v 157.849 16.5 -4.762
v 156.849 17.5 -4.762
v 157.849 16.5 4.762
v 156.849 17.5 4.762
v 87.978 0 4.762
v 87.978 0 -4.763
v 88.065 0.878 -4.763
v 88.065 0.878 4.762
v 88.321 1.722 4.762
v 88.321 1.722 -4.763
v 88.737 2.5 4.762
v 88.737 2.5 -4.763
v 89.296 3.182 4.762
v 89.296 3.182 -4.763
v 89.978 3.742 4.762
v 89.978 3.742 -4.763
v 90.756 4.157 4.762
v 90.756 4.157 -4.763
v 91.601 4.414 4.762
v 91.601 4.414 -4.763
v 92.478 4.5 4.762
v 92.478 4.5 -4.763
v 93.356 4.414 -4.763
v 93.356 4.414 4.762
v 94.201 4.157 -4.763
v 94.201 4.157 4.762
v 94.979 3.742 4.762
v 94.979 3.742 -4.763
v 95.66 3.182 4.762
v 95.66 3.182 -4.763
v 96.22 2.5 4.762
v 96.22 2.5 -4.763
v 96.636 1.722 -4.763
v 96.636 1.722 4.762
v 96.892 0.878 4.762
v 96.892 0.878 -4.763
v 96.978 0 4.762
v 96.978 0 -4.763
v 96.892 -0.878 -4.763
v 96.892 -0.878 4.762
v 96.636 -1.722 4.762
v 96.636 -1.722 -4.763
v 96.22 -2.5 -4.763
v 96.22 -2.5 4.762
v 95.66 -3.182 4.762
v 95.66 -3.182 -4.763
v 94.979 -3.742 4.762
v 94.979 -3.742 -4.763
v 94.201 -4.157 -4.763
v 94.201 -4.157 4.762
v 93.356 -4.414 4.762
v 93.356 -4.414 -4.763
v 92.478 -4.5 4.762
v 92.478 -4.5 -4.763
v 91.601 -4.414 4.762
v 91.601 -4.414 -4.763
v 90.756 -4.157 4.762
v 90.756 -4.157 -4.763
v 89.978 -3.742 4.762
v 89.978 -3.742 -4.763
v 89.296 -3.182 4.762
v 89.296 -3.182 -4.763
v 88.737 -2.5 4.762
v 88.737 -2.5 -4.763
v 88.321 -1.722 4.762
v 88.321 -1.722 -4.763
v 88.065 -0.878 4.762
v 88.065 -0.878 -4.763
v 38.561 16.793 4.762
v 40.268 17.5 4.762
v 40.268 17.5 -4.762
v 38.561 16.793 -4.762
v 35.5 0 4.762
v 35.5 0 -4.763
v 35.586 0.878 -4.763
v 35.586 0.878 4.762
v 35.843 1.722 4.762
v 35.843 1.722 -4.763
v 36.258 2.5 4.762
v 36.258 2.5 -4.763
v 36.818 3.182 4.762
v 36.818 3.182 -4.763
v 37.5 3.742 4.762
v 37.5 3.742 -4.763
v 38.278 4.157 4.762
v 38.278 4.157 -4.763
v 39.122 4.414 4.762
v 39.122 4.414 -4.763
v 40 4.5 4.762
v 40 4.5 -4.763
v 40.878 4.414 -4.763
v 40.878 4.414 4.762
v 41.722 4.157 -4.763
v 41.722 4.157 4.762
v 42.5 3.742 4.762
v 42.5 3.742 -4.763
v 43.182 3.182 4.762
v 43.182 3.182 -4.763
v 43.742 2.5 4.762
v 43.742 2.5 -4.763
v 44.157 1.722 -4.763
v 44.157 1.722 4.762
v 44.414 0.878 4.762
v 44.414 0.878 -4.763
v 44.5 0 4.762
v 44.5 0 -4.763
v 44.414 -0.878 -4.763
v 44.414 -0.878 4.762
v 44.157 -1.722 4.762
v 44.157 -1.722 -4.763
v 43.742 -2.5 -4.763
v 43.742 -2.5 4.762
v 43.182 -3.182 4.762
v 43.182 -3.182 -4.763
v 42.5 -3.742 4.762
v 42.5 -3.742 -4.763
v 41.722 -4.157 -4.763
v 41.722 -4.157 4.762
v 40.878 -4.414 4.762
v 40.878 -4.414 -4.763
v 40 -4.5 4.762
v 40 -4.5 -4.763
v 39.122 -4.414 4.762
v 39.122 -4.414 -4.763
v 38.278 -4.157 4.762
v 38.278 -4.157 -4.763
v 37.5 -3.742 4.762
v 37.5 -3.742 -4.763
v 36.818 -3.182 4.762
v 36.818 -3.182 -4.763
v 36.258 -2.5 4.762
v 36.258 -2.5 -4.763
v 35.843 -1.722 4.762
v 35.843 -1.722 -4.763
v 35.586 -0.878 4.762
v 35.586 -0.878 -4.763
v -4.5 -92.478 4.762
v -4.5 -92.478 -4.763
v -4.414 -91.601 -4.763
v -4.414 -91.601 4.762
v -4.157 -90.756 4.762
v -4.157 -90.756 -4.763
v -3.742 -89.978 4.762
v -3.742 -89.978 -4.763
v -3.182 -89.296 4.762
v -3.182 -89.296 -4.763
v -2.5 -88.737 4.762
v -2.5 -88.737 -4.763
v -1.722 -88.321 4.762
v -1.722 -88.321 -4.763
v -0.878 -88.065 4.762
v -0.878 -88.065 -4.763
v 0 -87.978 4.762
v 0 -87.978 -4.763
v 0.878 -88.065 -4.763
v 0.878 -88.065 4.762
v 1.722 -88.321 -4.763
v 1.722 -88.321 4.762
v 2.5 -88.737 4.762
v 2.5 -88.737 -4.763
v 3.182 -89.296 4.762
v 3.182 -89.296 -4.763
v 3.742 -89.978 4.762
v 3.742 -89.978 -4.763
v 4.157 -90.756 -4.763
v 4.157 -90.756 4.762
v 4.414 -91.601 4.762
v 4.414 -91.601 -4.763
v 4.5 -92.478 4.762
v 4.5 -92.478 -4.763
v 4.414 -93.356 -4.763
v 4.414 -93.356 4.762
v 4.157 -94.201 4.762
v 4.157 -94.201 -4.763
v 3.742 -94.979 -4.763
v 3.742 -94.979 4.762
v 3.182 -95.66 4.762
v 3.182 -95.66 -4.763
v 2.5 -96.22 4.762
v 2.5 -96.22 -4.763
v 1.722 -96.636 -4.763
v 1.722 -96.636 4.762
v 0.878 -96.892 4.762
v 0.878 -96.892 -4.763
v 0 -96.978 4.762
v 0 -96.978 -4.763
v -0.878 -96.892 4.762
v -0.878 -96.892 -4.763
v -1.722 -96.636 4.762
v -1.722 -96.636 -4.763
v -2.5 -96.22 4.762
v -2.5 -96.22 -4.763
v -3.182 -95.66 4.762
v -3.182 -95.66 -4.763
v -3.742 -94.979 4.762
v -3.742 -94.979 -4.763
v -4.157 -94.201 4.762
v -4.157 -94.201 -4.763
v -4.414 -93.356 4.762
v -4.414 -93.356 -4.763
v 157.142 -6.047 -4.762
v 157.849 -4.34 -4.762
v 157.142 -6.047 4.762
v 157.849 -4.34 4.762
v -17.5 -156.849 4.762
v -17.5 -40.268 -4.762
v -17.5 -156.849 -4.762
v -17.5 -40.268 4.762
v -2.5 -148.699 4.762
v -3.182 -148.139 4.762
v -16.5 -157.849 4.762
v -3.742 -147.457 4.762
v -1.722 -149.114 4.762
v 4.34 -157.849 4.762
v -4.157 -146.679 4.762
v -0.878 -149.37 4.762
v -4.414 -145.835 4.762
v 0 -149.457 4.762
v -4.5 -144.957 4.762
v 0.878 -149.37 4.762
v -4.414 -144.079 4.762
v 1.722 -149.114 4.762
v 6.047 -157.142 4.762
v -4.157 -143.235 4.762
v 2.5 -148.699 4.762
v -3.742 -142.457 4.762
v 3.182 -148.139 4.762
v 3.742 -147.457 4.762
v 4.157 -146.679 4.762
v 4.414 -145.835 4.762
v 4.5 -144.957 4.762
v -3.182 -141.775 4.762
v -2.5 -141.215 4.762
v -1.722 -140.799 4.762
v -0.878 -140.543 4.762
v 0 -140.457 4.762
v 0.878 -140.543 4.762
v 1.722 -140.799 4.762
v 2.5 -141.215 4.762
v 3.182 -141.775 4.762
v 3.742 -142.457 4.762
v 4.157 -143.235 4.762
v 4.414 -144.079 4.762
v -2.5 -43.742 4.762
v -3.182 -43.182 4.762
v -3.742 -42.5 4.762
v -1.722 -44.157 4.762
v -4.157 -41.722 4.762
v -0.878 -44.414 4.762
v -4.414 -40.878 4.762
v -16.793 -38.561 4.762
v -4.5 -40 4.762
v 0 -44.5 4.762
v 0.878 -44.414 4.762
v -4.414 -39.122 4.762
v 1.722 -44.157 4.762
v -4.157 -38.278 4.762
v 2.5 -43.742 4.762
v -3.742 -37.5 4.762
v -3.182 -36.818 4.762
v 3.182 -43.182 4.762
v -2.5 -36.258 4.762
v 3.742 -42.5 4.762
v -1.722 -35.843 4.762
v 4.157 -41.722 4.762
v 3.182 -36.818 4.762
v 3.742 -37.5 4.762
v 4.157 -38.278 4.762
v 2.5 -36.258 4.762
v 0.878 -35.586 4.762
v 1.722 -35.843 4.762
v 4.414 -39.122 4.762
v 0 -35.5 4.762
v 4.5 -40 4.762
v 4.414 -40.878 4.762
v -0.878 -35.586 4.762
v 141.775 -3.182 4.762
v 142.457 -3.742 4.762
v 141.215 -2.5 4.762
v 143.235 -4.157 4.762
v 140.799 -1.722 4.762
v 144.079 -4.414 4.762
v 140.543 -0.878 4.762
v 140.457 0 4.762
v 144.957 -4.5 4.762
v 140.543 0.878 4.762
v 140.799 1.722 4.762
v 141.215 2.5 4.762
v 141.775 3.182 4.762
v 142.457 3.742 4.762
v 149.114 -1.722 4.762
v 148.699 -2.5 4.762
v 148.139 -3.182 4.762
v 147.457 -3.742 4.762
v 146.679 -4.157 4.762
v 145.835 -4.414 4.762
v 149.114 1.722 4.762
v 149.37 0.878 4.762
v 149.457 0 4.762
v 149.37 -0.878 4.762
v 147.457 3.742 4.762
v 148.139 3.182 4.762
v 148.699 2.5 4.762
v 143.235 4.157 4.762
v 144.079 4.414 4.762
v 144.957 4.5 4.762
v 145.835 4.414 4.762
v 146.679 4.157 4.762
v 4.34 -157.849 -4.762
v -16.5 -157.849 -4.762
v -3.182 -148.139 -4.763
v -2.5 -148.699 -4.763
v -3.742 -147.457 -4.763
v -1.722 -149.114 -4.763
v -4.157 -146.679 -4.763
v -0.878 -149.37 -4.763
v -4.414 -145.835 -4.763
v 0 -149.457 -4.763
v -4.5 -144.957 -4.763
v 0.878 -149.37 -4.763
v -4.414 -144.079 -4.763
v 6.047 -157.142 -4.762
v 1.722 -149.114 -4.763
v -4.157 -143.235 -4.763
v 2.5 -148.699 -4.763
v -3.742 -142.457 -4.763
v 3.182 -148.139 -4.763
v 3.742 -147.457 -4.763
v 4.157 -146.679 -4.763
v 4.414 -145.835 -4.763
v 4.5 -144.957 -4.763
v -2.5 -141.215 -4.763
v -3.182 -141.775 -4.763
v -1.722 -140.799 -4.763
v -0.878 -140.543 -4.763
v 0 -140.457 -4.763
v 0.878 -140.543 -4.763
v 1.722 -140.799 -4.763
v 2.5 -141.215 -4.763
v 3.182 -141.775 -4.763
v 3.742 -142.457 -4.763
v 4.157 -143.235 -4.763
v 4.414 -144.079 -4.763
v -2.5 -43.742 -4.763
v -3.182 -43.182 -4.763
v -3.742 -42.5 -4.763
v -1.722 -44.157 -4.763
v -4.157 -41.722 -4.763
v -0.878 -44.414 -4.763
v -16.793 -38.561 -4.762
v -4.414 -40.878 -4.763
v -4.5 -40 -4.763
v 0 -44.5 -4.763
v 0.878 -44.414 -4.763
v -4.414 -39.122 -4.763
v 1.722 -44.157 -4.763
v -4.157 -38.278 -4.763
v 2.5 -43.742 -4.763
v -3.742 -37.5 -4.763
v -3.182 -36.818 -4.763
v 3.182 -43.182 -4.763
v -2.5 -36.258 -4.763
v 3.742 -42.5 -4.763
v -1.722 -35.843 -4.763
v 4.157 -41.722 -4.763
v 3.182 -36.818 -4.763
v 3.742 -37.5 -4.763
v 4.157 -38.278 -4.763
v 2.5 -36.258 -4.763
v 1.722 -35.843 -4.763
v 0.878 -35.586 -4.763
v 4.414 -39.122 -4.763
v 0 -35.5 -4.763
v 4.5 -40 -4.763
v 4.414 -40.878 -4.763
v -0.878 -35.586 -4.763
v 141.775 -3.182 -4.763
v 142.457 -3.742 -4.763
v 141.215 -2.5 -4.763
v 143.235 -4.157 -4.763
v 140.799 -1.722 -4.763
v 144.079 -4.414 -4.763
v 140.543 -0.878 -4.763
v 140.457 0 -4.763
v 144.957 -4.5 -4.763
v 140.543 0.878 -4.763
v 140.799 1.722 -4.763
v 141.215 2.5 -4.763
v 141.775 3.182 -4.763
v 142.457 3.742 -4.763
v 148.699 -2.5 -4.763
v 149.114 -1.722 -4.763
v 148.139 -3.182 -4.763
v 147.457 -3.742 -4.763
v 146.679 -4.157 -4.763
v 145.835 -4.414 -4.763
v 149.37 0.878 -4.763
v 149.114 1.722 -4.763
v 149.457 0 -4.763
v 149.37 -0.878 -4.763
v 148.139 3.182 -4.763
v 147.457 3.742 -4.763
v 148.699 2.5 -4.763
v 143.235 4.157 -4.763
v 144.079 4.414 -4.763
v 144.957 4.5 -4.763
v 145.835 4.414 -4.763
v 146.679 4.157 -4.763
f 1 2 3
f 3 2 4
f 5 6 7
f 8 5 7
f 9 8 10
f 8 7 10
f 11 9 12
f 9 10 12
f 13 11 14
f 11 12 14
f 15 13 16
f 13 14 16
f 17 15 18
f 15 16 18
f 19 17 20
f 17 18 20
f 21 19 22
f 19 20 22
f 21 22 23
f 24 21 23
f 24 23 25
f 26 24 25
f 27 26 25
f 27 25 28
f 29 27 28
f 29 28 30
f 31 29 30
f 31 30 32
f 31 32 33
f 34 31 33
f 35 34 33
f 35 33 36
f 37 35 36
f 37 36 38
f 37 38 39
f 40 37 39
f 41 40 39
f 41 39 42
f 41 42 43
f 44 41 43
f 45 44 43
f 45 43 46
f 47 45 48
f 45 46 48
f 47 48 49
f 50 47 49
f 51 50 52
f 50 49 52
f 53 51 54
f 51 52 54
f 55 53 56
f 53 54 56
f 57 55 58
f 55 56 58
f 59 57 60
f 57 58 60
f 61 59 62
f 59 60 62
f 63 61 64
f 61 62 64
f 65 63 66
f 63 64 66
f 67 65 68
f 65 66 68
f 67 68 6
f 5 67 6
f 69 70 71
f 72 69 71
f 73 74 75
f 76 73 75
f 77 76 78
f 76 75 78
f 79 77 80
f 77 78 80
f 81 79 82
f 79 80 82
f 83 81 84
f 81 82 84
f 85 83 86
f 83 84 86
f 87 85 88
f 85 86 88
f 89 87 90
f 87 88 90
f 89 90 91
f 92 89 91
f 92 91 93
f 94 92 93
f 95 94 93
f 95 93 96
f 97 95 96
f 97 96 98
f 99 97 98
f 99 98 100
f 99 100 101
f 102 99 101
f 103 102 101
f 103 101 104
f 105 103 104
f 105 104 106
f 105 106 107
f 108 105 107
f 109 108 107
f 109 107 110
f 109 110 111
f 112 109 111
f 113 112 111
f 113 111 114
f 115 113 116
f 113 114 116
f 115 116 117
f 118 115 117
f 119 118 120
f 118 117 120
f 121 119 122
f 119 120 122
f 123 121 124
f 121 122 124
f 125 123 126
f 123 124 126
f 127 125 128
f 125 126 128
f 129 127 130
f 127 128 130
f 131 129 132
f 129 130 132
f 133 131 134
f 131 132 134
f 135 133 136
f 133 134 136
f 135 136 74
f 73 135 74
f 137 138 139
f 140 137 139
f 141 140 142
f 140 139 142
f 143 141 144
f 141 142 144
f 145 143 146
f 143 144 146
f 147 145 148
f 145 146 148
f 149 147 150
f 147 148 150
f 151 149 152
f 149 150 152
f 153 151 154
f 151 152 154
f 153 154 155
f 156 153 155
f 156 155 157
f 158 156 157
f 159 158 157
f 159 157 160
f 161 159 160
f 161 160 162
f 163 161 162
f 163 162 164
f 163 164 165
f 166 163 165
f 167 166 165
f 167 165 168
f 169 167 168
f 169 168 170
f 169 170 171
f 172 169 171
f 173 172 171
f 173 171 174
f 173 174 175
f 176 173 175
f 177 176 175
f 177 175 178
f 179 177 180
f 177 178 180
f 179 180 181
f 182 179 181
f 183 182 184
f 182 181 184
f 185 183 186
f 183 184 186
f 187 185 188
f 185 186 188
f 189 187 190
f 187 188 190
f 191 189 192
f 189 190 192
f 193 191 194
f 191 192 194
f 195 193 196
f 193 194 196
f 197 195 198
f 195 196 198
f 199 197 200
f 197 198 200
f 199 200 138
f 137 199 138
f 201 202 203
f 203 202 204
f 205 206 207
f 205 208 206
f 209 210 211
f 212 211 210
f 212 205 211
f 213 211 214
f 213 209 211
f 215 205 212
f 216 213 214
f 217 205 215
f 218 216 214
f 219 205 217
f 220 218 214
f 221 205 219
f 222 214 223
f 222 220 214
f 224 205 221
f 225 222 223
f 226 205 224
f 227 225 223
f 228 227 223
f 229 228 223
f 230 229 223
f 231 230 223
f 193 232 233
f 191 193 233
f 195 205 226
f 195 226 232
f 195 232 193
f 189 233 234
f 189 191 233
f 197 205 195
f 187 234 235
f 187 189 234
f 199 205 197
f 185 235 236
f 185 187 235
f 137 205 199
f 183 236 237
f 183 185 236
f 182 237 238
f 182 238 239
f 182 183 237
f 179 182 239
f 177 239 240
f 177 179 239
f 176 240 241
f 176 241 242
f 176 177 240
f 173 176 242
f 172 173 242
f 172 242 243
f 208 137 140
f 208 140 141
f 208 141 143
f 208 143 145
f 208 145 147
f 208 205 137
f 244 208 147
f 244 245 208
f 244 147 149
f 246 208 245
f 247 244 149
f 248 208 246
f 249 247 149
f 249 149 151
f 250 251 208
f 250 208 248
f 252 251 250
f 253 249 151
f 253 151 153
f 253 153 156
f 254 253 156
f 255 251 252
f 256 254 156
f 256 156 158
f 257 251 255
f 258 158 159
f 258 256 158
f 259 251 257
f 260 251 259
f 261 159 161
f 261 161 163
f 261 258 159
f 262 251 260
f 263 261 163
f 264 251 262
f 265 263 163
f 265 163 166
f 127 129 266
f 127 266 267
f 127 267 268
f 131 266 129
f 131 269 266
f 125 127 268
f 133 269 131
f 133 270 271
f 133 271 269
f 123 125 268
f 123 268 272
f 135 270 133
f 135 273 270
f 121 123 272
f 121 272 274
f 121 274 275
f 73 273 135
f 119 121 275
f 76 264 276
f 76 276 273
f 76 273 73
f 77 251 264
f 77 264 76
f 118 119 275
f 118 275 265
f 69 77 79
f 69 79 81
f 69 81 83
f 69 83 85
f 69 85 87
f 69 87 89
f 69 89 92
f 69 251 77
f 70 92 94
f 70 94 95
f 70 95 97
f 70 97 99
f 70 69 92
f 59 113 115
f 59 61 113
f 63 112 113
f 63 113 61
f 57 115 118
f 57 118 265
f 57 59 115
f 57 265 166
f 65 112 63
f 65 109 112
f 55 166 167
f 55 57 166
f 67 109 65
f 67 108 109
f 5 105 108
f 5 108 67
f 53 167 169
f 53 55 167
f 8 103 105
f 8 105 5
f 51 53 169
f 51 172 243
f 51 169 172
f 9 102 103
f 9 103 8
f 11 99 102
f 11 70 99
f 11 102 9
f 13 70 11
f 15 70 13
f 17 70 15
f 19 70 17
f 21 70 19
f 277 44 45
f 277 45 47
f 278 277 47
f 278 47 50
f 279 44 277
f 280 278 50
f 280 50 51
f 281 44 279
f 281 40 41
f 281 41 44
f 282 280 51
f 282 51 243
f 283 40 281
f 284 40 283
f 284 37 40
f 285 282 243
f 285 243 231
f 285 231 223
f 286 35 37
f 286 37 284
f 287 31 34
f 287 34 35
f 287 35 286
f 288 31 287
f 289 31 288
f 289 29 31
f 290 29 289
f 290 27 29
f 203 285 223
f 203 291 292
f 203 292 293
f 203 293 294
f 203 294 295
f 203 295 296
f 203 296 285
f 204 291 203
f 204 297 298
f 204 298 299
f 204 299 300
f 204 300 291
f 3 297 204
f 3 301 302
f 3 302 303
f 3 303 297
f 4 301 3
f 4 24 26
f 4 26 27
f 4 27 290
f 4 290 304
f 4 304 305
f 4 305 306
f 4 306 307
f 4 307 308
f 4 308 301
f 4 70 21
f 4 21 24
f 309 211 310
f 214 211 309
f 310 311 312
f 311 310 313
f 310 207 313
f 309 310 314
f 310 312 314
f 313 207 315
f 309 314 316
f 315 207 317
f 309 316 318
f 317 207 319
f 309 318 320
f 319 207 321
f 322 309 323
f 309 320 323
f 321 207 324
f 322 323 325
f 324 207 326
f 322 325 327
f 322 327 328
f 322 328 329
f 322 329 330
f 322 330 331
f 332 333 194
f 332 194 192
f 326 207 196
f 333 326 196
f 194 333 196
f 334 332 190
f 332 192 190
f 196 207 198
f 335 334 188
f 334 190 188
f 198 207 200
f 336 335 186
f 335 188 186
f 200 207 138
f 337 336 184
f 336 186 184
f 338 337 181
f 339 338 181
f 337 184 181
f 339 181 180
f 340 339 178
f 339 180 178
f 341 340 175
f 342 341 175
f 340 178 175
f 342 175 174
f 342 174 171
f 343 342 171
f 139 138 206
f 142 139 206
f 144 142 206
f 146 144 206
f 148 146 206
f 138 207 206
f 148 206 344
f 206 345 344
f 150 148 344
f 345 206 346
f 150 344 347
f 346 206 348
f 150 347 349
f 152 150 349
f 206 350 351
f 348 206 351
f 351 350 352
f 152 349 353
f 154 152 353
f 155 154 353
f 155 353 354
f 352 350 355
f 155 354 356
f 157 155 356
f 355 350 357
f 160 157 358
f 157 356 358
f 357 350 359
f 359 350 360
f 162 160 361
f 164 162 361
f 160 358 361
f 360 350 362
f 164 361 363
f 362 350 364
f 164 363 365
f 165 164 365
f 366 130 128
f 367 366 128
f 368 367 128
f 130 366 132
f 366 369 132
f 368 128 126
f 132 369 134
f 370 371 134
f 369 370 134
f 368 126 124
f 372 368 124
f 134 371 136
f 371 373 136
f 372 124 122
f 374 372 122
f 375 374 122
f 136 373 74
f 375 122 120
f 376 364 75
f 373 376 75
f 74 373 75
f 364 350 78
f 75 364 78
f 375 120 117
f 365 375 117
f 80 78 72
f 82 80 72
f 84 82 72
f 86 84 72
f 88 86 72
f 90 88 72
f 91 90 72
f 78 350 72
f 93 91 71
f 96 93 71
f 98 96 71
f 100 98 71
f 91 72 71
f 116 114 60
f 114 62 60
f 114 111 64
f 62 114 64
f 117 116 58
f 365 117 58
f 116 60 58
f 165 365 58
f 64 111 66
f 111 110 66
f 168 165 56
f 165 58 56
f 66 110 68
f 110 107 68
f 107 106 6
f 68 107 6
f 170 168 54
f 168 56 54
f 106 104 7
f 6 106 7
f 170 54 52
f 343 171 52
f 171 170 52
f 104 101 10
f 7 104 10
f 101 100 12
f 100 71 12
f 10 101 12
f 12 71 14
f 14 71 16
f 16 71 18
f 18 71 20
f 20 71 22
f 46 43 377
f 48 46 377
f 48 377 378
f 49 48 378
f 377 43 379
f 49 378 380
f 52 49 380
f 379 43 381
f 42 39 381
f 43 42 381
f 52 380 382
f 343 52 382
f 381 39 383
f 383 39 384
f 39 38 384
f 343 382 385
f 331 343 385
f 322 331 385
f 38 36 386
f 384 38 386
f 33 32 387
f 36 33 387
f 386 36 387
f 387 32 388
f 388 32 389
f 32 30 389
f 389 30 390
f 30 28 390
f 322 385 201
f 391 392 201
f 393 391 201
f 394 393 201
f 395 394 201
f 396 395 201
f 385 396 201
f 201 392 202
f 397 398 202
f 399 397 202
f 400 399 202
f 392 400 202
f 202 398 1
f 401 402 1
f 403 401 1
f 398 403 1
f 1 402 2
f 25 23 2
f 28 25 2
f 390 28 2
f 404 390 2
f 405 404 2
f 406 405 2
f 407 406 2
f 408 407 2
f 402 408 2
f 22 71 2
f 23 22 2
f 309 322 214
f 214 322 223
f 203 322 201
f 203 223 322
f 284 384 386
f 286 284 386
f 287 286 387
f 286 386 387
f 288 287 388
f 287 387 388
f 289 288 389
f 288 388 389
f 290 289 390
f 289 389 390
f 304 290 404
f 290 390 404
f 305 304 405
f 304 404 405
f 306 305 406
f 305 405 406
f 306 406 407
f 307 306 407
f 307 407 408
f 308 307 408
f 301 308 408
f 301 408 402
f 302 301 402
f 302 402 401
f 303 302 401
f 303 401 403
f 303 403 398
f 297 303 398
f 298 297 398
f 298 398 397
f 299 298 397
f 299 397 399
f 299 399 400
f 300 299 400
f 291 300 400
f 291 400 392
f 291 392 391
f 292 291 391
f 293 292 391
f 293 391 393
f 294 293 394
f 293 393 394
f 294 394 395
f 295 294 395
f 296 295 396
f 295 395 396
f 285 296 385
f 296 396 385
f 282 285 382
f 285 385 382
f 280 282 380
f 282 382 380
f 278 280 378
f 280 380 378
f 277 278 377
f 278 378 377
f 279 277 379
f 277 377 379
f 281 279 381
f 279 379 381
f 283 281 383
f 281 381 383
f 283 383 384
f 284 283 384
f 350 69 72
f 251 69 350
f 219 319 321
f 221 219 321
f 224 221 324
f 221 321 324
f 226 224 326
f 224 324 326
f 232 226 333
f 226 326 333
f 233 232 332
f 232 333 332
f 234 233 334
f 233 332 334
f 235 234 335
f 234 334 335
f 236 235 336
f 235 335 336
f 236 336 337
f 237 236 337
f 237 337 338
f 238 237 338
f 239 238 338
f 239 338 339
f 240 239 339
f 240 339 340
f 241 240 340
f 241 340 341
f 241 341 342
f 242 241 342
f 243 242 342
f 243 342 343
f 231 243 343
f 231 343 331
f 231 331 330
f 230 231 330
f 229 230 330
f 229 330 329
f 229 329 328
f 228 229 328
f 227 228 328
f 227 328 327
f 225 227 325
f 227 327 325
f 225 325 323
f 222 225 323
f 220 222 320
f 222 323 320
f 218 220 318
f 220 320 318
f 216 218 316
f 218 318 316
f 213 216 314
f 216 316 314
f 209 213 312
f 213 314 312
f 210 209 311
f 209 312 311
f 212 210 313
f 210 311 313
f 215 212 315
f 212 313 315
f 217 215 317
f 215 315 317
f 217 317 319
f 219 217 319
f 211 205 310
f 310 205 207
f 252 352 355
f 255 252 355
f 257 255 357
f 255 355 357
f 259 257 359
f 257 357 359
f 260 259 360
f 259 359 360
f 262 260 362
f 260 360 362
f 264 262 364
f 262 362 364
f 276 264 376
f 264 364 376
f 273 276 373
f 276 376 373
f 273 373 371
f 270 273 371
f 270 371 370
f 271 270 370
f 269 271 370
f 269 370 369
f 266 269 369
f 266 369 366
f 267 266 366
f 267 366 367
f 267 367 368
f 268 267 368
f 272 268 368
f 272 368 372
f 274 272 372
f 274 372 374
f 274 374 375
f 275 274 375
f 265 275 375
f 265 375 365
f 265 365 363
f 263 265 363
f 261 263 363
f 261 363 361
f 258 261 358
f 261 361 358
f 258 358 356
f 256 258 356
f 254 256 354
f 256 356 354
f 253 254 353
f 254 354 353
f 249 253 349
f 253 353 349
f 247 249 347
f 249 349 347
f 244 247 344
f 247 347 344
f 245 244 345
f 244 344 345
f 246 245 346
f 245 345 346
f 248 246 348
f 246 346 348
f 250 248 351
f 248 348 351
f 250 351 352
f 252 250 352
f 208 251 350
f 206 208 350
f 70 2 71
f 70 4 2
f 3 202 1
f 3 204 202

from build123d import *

# Parameters (mm, degrees)
BOSS_EXTRUDE1_DEPTH  = 4.7625
M8_CLEARANCE_HOLE1_D = 9
CHAMFER1_SIZE        = 1


with BuildPart() as part:
    # Sketch1 → Boss-Extrude1 (new, symmetric)
    with BuildSketch(Plane.XY):
        Polygon((-17.5, -157.849025767), (5.340097423, -157.849025767), (157.849025767, -5.340097423), (157.849025767, 17.5), (39.267766953, 17.5), (-17.5, -39.267766953), align=None)
    extrude(amount=BOSS_EXTRUDE1_DEPTH, both=True)

    # M8 Clearance Hole1 (through all)
    with Locations(Plane.XY.offset(4.7625)):
        with Locations((0, -92.478445072), (144.956890143, 0), (92.478445072, 0), (0, -40), (0, -144.956890143), (40, 0)):
            Hole(M8_CLEARANCE_HOLE1_D / 2)

    # Chamfer1
    chamfer1_edges = [part.edges().sort_by_distance(p)[0] for p in [
        (157.849025767, 17.5, 0),
        (157.849025767, -5.340097423, 0),
        (5.340097423, -157.849025767, 0),
        (-17.5, -157.849025767, 0),
        (-17.5, -39.267766953, 0),
        (39.267766953, 17.5, 0),
    ]]
    chamfer(chamfer1_edges, length=CHAMFER1_SIZE)


solid = part.part
